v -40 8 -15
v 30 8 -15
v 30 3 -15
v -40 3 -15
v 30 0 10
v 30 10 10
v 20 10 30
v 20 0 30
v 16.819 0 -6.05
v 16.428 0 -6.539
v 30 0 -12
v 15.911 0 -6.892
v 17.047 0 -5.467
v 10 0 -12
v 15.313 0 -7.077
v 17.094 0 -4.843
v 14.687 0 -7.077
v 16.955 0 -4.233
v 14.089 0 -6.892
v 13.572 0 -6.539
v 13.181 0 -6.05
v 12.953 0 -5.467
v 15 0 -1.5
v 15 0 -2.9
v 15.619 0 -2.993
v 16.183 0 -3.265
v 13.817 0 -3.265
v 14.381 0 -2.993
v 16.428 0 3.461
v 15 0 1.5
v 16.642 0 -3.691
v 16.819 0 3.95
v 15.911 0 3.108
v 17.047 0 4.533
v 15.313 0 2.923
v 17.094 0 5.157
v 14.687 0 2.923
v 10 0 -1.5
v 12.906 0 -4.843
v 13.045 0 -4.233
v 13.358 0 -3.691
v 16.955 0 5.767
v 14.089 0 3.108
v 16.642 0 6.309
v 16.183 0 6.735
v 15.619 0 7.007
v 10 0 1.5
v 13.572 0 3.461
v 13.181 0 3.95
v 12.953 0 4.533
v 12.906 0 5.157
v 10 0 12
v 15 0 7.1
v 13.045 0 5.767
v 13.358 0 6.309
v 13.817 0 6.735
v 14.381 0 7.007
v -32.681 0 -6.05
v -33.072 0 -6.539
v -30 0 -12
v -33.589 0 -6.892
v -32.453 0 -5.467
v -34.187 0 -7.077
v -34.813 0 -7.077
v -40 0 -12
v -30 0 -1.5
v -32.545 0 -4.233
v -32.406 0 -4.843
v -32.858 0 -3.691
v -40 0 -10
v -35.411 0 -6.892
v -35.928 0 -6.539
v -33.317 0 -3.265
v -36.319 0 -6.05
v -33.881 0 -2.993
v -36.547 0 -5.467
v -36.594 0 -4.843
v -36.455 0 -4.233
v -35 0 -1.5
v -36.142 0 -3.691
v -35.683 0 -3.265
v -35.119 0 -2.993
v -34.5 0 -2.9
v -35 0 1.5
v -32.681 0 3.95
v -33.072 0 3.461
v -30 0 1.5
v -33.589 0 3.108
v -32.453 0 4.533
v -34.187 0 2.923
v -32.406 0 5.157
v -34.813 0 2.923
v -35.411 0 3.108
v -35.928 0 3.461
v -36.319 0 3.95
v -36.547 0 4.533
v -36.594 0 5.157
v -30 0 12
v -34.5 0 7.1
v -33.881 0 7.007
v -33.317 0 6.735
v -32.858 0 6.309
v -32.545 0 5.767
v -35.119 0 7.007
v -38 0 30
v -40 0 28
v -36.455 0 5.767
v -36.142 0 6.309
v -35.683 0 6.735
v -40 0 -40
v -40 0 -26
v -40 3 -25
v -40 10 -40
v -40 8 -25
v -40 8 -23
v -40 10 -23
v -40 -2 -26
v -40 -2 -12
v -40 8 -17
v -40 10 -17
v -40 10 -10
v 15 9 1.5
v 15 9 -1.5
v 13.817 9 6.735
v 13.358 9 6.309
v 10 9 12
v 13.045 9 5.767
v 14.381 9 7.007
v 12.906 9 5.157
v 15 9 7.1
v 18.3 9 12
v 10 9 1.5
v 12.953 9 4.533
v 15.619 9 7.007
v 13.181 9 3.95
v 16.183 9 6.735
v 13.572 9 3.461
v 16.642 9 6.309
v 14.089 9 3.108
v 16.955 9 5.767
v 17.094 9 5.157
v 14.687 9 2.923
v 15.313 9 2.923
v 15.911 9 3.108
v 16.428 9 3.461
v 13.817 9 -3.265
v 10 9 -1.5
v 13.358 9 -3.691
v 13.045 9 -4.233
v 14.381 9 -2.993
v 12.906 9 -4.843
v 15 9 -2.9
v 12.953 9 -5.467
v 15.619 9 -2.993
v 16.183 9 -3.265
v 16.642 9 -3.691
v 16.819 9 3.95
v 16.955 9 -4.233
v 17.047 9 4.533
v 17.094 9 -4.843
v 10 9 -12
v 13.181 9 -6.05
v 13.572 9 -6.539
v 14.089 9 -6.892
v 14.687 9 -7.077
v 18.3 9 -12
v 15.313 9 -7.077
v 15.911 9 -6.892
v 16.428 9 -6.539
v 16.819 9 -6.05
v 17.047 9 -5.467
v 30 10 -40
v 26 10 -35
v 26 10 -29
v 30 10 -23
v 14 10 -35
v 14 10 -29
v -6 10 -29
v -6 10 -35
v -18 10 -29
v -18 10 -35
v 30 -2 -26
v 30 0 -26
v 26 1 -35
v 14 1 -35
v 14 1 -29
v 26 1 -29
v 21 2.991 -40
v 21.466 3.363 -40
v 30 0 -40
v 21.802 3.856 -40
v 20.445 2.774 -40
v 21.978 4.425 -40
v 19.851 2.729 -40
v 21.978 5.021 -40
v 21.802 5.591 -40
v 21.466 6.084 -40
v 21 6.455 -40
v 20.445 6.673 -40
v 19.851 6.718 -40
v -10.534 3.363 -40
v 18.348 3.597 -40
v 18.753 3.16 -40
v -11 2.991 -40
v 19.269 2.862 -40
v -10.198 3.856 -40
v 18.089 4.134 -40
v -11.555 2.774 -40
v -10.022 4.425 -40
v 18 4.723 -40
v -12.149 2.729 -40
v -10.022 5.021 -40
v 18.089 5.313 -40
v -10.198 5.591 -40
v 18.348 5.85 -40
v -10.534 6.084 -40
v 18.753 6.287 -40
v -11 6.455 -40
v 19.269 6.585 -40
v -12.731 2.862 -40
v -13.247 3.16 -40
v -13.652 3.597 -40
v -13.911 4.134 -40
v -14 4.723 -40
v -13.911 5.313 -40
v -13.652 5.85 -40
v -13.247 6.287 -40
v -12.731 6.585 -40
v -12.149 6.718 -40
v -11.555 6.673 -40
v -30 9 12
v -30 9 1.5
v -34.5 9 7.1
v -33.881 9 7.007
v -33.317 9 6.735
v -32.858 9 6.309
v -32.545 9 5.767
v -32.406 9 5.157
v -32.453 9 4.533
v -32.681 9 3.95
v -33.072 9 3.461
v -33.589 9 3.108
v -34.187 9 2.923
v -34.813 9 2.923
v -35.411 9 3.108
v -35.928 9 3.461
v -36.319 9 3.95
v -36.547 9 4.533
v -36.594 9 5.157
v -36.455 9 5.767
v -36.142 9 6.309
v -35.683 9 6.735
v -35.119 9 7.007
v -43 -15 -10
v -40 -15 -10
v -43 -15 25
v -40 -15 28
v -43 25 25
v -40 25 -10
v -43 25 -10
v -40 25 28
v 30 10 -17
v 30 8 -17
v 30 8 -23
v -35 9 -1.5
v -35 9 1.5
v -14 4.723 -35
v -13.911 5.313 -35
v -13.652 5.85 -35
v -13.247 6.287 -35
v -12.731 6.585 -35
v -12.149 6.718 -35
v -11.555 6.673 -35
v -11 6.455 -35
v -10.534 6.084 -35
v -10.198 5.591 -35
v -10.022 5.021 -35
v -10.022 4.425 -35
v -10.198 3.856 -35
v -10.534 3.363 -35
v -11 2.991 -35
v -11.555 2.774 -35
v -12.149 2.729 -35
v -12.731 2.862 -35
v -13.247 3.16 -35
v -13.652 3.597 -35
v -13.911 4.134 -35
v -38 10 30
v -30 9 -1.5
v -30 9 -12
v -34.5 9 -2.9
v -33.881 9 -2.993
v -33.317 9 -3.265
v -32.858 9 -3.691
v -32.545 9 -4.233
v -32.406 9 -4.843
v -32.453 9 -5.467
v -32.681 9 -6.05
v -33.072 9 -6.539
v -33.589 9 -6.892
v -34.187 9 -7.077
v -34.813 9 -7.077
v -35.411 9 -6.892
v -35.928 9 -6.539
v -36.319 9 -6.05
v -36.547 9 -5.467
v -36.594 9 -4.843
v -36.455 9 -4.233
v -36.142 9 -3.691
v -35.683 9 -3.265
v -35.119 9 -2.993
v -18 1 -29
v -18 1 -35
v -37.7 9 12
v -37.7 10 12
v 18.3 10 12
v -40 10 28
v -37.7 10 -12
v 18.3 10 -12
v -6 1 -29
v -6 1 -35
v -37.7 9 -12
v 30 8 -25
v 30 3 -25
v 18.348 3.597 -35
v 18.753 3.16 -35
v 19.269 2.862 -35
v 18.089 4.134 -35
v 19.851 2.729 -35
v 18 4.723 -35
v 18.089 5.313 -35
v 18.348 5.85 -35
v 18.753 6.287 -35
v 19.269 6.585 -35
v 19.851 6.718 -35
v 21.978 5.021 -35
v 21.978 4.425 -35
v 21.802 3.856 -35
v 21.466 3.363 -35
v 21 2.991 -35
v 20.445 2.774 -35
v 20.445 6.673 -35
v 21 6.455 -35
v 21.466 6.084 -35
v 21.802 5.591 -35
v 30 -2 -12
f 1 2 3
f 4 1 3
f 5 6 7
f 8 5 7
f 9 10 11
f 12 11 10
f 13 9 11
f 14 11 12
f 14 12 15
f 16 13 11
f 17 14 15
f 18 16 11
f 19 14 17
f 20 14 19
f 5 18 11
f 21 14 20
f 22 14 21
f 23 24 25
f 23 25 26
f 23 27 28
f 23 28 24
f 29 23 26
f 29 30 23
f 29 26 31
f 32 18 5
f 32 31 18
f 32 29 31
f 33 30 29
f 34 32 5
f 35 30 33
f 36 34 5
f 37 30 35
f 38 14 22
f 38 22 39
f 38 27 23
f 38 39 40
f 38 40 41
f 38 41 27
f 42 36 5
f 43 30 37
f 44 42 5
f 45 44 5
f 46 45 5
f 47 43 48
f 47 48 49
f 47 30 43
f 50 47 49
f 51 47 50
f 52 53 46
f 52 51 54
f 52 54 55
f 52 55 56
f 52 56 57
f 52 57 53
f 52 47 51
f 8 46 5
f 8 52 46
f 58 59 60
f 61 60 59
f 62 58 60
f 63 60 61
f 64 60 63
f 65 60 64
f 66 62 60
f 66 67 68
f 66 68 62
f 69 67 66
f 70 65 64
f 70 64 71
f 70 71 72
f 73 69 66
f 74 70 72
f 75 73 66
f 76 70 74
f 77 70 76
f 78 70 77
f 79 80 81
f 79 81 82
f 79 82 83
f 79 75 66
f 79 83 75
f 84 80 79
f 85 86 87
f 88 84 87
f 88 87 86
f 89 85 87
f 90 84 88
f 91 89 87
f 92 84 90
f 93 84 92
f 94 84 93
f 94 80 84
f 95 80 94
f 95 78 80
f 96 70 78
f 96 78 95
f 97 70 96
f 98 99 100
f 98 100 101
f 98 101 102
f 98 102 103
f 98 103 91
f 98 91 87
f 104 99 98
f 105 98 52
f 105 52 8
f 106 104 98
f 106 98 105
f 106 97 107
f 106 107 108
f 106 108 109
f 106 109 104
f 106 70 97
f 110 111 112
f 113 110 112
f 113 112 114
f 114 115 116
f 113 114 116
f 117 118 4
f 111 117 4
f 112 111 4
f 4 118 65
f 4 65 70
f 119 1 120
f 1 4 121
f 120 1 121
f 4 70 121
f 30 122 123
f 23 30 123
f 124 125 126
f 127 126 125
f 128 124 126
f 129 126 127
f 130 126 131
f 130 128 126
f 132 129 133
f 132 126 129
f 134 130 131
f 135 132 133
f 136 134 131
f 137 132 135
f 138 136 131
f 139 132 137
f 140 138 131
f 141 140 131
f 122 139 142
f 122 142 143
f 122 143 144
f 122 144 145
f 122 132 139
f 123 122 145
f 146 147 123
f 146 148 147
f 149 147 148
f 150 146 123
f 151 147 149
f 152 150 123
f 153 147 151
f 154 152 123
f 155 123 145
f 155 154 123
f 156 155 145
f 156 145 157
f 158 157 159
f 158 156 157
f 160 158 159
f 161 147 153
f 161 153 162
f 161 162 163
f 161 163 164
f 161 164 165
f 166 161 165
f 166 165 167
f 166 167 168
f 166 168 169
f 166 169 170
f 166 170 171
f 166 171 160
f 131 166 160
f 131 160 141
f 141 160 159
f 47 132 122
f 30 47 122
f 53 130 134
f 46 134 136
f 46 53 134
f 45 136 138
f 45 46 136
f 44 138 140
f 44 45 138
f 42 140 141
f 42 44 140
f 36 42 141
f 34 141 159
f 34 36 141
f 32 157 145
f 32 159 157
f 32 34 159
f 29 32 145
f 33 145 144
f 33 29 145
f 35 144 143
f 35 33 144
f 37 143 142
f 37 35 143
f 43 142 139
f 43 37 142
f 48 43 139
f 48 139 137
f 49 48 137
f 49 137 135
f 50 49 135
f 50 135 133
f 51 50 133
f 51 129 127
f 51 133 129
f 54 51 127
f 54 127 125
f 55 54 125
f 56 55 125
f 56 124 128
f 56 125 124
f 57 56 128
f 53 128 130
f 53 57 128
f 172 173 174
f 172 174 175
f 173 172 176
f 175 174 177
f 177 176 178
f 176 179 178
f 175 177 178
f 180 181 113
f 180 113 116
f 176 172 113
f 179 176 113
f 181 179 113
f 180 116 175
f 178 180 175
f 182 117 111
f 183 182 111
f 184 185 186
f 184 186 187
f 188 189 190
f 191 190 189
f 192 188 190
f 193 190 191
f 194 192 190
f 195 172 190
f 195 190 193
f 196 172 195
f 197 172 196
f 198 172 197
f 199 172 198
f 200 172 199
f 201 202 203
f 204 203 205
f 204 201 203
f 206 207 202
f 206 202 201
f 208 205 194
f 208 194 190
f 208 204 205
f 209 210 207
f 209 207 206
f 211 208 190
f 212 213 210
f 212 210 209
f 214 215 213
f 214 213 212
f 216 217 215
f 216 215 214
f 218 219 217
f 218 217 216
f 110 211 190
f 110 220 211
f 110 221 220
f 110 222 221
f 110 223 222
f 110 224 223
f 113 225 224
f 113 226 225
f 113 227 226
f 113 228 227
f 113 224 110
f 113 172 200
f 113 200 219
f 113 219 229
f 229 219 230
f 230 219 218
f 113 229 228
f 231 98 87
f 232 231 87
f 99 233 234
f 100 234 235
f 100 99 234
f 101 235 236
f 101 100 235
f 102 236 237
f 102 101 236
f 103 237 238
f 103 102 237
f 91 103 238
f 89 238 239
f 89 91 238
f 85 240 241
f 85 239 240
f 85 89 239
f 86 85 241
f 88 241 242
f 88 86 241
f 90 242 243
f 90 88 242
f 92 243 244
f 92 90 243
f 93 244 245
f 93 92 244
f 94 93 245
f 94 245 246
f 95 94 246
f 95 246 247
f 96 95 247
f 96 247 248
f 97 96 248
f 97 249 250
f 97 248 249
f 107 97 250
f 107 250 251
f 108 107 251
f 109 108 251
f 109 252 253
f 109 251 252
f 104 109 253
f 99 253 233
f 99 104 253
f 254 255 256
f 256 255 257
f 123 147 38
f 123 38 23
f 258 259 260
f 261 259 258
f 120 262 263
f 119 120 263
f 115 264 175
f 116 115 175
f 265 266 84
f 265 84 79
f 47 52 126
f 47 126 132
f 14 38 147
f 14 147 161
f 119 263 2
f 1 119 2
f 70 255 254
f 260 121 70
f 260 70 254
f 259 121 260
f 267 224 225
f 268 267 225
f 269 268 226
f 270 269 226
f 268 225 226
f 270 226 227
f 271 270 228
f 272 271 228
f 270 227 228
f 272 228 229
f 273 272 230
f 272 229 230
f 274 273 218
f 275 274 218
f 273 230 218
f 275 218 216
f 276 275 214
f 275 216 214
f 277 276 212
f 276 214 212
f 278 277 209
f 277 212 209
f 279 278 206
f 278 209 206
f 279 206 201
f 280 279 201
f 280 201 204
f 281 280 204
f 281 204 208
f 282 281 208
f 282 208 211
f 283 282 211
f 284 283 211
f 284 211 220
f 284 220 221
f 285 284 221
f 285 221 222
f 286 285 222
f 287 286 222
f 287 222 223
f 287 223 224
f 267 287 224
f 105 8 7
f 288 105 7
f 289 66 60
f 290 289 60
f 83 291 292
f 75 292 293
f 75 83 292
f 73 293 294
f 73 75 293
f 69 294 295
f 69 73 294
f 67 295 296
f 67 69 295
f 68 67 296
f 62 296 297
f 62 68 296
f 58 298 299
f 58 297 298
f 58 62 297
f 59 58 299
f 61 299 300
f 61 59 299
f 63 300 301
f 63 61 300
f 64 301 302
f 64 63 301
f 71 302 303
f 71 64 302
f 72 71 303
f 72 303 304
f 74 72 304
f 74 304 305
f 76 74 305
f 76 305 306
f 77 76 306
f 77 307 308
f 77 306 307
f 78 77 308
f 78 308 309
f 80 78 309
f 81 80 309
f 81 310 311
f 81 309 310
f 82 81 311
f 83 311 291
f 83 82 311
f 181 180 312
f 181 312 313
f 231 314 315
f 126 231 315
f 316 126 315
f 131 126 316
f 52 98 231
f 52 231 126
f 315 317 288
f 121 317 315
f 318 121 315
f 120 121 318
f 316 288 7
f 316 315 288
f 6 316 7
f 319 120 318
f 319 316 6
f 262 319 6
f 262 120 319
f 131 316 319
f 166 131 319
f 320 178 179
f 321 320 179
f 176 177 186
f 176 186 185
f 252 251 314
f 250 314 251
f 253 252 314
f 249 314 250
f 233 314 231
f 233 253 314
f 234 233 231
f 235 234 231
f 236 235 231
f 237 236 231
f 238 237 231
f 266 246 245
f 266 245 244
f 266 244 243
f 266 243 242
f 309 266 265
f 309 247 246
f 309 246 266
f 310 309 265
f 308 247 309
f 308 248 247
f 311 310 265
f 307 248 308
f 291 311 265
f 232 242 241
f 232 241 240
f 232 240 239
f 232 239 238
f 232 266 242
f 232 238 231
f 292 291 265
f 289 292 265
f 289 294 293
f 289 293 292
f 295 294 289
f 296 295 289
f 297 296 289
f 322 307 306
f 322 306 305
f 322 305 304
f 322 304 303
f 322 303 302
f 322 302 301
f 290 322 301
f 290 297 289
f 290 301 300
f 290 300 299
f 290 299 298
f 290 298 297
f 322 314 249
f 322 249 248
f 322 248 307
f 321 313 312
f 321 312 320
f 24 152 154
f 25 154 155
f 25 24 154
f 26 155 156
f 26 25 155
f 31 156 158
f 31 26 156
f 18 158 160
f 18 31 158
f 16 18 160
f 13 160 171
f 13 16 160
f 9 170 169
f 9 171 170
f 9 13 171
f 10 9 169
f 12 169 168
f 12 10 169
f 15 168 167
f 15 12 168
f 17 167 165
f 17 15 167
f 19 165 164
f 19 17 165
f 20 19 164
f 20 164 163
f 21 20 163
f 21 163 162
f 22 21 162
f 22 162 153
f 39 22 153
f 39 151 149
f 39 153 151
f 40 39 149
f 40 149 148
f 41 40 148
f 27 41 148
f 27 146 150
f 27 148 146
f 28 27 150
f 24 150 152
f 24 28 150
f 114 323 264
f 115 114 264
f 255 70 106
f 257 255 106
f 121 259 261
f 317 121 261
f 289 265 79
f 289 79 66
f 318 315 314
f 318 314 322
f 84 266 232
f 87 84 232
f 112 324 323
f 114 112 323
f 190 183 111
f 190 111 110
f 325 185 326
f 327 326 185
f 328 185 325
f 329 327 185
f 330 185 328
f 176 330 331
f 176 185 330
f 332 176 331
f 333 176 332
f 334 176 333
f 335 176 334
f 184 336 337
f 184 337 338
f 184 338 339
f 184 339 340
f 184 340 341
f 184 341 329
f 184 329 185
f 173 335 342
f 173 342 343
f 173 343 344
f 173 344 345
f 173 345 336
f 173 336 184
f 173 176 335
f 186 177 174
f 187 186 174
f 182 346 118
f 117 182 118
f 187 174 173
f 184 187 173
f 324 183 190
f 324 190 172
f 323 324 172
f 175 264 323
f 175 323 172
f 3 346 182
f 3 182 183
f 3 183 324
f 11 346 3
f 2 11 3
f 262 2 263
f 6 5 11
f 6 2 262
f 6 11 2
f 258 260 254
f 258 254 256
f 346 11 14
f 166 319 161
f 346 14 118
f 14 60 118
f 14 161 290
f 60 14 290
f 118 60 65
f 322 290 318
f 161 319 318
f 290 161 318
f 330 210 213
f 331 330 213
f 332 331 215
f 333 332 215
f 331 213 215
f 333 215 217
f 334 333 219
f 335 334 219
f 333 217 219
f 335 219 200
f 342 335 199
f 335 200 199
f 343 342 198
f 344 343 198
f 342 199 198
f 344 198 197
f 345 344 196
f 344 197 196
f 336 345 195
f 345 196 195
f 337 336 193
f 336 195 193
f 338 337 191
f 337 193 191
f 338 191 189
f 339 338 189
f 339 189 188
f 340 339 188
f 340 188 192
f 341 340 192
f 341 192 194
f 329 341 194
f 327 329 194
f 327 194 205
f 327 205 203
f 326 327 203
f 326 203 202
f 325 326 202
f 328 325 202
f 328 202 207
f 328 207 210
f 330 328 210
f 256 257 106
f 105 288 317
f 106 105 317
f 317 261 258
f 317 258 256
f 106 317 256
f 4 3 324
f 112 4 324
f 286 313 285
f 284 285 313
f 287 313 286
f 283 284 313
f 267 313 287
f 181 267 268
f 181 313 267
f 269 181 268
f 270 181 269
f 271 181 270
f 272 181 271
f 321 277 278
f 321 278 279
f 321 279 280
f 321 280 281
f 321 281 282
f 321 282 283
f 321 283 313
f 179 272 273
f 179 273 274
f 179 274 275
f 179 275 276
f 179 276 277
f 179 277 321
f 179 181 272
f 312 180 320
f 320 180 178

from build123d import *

# Parameters (mm, degrees)
SKETCH_1_W           = 80
SKETCH_1_H           = 60
SKETCH_1_R           = 2.1
SKETCH_1_W_2         = 40
SKETCH_1_H_2         = 24
EXTRUDE_1_DEPTH      = 10
CUT_EXTRUDE_1_DEPTH  = 80
SKETCH_5_W           = 5
SKETCH_5_H           = 3
CUT_EXTRUDE_2_DEPTH  = 80
SKETCH_7_W           = 56
SKETCH_7_H           = 24
CUT_EXTRUDE_3_DEPTH  = 1
SKETCH_8_W           = 40
SKETCH_8_H           = 40
EXTRUDE_2_DEPTH      = 3
SKETCH_9_W           = 10
SKETCH_9_H           = 60
CUT_EXTRUDE_4_DEPTH  = 10
CUT_EXTRUDE_11_DEPTH = 28
CUT_EXTRUDE_12_DEPTH = 41
SKETCH_24_W          = 10
SKETCH_24_H          = 10
EXTRUDE_3_DEPTH      = 70
SKETCH_25_W          = 12
SKETCH_25_H          = 6
CUT_EXTRUDE_13_DEPTH = 9
SKETCH_26_R          = 2
CUT_EXTRUDE_14_DEPTH = 8
CUT_EXTRUDE_15_REACH = 65.828
EXTRUDE_START        = -28
SKETCH_28_W          = 70
SKETCH_28_H          = 2
EXTRUDE_4_DEPTH      = 28
CUT_EXTRUDE_START    = -70
SKETCH_29_W          = 14
SKETCH_29_H          = 2
CUT_EXTRUDE_16_DEPTH = 70


with BuildPart() as part:
    # 草圖1 → 填料-伸長1 (new body)
    with BuildSketch(Plane(origin=(0, 0, 0), x_dir=(1, 0, 0), z_dir=(0, 1, 0))):
        Rectangle(SKETCH_1_W, SKETCH_1_H)
        with Locations(Location((-34.5, -5, 0), (0, 0, 270))):
            Circle(SKETCH_1_R, mode=Mode.SUBTRACT)
        with Locations(Location((-34.5, 5, 0), (0, 0, 270))):
            Circle(SKETCH_1_R, mode=Mode.SUBTRACT)
        with Locations(Location((15, -5, 0), (0, 0, 270))):
            Circle(SKETCH_1_R, mode=Mode.SUBTRACT)
        with Locations(Location((15, 5, 0), (0, 0, 270))):
            Circle(SKETCH_1_R, mode=Mode.SUBTRACT)
        with Locations((-10, 0)):
            Rectangle(SKETCH_1_W_2, SKETCH_1_H_2, mode=Mode.SUBTRACT)
    extrude(amount=EXTRUDE_1_DEPTH)

    # 草圖4 → 除料-伸長1 (cut)
    with BuildSketch(Plane(origin=(40, 0, 0), x_dir=(0, 0, -1), z_dir=(1, 0, 0))):
        Polygon((17, 10), (17, 8), (15, 8), (15, 3), (25, 3), (25, 8), (23, 8), (23, 10), align=None)
    extrude(amount=-CUT_EXTRUDE_1_DEPTH, mode=Mode.SUBTRACT)

    # 草圖5 → 除料-伸長2 (cut)
    with BuildSketch(Plane(origin=(0, 10, 0), x_dir=(1, 0, 0), z_dir=(0, 1, 0))):
        with Locations((12.5, 0)):
            Rectangle(SKETCH_5_W, SKETCH_5_H)
        with Locations((-32.5, 0)):
            Rectangle(SKETCH_5_W, SKETCH_5_H)
    extrude(amount=-CUT_EXTRUDE_2_DEPTH, mode=Mode.SUBTRACT)

    # 草圖7 → 除料-伸長3 (cut)
    with BuildSketch(Plane(origin=(0, 10, 0), x_dir=(1, 0, 0), z_dir=(0, 1, 0))):
        with Locations((-9.7, 0)):
            Rectangle(SKETCH_7_W, SKETCH_7_H)
    extrude(amount=-CUT_EXTRUDE_3_DEPTH, mode=Mode.SUBTRACT)

    # 草圖8 → 填料-伸長2 (add)
    with BuildSketch(Plane.ZY.offset(40)):
        with Locations((10, 5)):
            Rectangle(SKETCH_8_W, SKETCH_8_H)
    extrude(amount=EXTRUDE_2_DEPTH)

    # 草圖9 → 除料-伸長4 (cut)
    with BuildSketch(Plane(origin=(0, 10, 0), x_dir=(1, 0, 0), z_dir=(0, 1, 0))):
        with Locations((35, 0)):
            Rectangle(SKETCH_9_W, SKETCH_9_H)
    extrude(amount=-CUT_EXTRUDE_4_DEPTH, mode=Mode.SUBTRACT)

    # 草圖22 → 除料-伸長11 (cut)
    with BuildSketch(Plane(origin=(0, 10, 0), x_dir=(1, 0, 0), z_dir=(0, 1, 0))):
        Polygon((-43, -25), (-43, -30), (-38, -30), align=None)
    extrude(amount=-CUT_EXTRUDE_11_DEPTH, mode=Mode.SUBTRACT)

    # 草圖23 → 除料-伸長12 (cut)
    with BuildSketch(Plane(origin=(0, 25, 0), x_dir=(1, 0, 0), z_dir=(0, 1, 0))):
        Polygon((-43, -30), (-38, -30), (-43, -25), align=None)
    extrude(amount=-CUT_EXTRUDE_12_DEPTH, mode=Mode.SUBTRACT)

    # 草圖24 → 填料-伸長3 (add)
    with BuildSketch(Plane.ZY.offset(40)):
        with Locations((-35, 5)):
            Rectangle(SKETCH_24_W, SKETCH_24_H)
    extrude(amount=-EXTRUDE_3_DEPTH)

    # 草圖25 → 除料-伸長13 (cut)
    with BuildSketch(Plane(origin=(0, 10, 0), x_dir=(1, 0, 0), z_dir=(0, 1, 0))):
        with Locations((-12, 32)):
            Rectangle(SKETCH_25_W, SKETCH_25_H)
        with Locations((20, 32)):
            Rectangle(SKETCH_25_W, SKETCH_25_H)
    extrude(amount=-CUT_EXTRUDE_13_DEPTH, mode=Mode.SUBTRACT)

    # 草圖26 → 除料-伸長14 (cut)
    with BuildSketch(Plane(origin=(0, 0, -40), x_dir=(-1, 0, 0), z_dir=(0, 0, -1))):
        with Locations((-20, 4.723394197)):
            Circle(SKETCH_26_R)
        with Locations((12, 4.723394197)):
            Circle(SKETCH_26_R)
    extrude(amount=-CUT_EXTRUDE_14_DEPTH, mode=Mode.SUBTRACT)

    # 草圖27 → 除料-伸長15 (cut, up to next)
    with BuildSketch(Plane(origin=(0, 10, 0), x_dir=(1, 0, 0), z_dir=(0, 1, 0)), mode=Mode.PRIVATE) as cut_extrude_15_sk1:
        Polygon((30, -10), (20, -30), (30, -30), align=None)
    cut_extrude_15_tool1 = extrude(cut_extrude_15_sk1.sketch, amount=-CUT_EXTRUDE_15_REACH, mode=Mode.PRIVATE) & part.part
    add(cut_extrude_15_tool1.solids().sort_by_distance((26.666667, 10, 23.333333))[0], mode=Mode.SUBTRACT)

    # 草圖28 → 填料-伸長4 (add)
    with BuildSketch(Plane(origin=(0, 0, -40), x_dir=(-1, 0, 0), z_dir=(0, 0, -1)).offset(EXTRUDE_START)):
        with Locations((5, -1)):
            Rectangle(SKETCH_28_W, SKETCH_28_H)
    extrude(amount=EXTRUDE_4_DEPTH)

    # 草圖29 → 除料-伸長16 (cut)
    with BuildSketch(Plane(origin=(30, 0, 0), x_dir=(0, 0, -1), z_dir=(1, 0, 0)).offset(CUT_EXTRUDE_START)):
        with Locations((33, -1)):
            Rectangle(SKETCH_29_W, SKETCH_29_H)
    extrude(amount=CUT_EXTRUDE_16_DEPTH, mode=Mode.SUBTRACT)


solid = part.part
